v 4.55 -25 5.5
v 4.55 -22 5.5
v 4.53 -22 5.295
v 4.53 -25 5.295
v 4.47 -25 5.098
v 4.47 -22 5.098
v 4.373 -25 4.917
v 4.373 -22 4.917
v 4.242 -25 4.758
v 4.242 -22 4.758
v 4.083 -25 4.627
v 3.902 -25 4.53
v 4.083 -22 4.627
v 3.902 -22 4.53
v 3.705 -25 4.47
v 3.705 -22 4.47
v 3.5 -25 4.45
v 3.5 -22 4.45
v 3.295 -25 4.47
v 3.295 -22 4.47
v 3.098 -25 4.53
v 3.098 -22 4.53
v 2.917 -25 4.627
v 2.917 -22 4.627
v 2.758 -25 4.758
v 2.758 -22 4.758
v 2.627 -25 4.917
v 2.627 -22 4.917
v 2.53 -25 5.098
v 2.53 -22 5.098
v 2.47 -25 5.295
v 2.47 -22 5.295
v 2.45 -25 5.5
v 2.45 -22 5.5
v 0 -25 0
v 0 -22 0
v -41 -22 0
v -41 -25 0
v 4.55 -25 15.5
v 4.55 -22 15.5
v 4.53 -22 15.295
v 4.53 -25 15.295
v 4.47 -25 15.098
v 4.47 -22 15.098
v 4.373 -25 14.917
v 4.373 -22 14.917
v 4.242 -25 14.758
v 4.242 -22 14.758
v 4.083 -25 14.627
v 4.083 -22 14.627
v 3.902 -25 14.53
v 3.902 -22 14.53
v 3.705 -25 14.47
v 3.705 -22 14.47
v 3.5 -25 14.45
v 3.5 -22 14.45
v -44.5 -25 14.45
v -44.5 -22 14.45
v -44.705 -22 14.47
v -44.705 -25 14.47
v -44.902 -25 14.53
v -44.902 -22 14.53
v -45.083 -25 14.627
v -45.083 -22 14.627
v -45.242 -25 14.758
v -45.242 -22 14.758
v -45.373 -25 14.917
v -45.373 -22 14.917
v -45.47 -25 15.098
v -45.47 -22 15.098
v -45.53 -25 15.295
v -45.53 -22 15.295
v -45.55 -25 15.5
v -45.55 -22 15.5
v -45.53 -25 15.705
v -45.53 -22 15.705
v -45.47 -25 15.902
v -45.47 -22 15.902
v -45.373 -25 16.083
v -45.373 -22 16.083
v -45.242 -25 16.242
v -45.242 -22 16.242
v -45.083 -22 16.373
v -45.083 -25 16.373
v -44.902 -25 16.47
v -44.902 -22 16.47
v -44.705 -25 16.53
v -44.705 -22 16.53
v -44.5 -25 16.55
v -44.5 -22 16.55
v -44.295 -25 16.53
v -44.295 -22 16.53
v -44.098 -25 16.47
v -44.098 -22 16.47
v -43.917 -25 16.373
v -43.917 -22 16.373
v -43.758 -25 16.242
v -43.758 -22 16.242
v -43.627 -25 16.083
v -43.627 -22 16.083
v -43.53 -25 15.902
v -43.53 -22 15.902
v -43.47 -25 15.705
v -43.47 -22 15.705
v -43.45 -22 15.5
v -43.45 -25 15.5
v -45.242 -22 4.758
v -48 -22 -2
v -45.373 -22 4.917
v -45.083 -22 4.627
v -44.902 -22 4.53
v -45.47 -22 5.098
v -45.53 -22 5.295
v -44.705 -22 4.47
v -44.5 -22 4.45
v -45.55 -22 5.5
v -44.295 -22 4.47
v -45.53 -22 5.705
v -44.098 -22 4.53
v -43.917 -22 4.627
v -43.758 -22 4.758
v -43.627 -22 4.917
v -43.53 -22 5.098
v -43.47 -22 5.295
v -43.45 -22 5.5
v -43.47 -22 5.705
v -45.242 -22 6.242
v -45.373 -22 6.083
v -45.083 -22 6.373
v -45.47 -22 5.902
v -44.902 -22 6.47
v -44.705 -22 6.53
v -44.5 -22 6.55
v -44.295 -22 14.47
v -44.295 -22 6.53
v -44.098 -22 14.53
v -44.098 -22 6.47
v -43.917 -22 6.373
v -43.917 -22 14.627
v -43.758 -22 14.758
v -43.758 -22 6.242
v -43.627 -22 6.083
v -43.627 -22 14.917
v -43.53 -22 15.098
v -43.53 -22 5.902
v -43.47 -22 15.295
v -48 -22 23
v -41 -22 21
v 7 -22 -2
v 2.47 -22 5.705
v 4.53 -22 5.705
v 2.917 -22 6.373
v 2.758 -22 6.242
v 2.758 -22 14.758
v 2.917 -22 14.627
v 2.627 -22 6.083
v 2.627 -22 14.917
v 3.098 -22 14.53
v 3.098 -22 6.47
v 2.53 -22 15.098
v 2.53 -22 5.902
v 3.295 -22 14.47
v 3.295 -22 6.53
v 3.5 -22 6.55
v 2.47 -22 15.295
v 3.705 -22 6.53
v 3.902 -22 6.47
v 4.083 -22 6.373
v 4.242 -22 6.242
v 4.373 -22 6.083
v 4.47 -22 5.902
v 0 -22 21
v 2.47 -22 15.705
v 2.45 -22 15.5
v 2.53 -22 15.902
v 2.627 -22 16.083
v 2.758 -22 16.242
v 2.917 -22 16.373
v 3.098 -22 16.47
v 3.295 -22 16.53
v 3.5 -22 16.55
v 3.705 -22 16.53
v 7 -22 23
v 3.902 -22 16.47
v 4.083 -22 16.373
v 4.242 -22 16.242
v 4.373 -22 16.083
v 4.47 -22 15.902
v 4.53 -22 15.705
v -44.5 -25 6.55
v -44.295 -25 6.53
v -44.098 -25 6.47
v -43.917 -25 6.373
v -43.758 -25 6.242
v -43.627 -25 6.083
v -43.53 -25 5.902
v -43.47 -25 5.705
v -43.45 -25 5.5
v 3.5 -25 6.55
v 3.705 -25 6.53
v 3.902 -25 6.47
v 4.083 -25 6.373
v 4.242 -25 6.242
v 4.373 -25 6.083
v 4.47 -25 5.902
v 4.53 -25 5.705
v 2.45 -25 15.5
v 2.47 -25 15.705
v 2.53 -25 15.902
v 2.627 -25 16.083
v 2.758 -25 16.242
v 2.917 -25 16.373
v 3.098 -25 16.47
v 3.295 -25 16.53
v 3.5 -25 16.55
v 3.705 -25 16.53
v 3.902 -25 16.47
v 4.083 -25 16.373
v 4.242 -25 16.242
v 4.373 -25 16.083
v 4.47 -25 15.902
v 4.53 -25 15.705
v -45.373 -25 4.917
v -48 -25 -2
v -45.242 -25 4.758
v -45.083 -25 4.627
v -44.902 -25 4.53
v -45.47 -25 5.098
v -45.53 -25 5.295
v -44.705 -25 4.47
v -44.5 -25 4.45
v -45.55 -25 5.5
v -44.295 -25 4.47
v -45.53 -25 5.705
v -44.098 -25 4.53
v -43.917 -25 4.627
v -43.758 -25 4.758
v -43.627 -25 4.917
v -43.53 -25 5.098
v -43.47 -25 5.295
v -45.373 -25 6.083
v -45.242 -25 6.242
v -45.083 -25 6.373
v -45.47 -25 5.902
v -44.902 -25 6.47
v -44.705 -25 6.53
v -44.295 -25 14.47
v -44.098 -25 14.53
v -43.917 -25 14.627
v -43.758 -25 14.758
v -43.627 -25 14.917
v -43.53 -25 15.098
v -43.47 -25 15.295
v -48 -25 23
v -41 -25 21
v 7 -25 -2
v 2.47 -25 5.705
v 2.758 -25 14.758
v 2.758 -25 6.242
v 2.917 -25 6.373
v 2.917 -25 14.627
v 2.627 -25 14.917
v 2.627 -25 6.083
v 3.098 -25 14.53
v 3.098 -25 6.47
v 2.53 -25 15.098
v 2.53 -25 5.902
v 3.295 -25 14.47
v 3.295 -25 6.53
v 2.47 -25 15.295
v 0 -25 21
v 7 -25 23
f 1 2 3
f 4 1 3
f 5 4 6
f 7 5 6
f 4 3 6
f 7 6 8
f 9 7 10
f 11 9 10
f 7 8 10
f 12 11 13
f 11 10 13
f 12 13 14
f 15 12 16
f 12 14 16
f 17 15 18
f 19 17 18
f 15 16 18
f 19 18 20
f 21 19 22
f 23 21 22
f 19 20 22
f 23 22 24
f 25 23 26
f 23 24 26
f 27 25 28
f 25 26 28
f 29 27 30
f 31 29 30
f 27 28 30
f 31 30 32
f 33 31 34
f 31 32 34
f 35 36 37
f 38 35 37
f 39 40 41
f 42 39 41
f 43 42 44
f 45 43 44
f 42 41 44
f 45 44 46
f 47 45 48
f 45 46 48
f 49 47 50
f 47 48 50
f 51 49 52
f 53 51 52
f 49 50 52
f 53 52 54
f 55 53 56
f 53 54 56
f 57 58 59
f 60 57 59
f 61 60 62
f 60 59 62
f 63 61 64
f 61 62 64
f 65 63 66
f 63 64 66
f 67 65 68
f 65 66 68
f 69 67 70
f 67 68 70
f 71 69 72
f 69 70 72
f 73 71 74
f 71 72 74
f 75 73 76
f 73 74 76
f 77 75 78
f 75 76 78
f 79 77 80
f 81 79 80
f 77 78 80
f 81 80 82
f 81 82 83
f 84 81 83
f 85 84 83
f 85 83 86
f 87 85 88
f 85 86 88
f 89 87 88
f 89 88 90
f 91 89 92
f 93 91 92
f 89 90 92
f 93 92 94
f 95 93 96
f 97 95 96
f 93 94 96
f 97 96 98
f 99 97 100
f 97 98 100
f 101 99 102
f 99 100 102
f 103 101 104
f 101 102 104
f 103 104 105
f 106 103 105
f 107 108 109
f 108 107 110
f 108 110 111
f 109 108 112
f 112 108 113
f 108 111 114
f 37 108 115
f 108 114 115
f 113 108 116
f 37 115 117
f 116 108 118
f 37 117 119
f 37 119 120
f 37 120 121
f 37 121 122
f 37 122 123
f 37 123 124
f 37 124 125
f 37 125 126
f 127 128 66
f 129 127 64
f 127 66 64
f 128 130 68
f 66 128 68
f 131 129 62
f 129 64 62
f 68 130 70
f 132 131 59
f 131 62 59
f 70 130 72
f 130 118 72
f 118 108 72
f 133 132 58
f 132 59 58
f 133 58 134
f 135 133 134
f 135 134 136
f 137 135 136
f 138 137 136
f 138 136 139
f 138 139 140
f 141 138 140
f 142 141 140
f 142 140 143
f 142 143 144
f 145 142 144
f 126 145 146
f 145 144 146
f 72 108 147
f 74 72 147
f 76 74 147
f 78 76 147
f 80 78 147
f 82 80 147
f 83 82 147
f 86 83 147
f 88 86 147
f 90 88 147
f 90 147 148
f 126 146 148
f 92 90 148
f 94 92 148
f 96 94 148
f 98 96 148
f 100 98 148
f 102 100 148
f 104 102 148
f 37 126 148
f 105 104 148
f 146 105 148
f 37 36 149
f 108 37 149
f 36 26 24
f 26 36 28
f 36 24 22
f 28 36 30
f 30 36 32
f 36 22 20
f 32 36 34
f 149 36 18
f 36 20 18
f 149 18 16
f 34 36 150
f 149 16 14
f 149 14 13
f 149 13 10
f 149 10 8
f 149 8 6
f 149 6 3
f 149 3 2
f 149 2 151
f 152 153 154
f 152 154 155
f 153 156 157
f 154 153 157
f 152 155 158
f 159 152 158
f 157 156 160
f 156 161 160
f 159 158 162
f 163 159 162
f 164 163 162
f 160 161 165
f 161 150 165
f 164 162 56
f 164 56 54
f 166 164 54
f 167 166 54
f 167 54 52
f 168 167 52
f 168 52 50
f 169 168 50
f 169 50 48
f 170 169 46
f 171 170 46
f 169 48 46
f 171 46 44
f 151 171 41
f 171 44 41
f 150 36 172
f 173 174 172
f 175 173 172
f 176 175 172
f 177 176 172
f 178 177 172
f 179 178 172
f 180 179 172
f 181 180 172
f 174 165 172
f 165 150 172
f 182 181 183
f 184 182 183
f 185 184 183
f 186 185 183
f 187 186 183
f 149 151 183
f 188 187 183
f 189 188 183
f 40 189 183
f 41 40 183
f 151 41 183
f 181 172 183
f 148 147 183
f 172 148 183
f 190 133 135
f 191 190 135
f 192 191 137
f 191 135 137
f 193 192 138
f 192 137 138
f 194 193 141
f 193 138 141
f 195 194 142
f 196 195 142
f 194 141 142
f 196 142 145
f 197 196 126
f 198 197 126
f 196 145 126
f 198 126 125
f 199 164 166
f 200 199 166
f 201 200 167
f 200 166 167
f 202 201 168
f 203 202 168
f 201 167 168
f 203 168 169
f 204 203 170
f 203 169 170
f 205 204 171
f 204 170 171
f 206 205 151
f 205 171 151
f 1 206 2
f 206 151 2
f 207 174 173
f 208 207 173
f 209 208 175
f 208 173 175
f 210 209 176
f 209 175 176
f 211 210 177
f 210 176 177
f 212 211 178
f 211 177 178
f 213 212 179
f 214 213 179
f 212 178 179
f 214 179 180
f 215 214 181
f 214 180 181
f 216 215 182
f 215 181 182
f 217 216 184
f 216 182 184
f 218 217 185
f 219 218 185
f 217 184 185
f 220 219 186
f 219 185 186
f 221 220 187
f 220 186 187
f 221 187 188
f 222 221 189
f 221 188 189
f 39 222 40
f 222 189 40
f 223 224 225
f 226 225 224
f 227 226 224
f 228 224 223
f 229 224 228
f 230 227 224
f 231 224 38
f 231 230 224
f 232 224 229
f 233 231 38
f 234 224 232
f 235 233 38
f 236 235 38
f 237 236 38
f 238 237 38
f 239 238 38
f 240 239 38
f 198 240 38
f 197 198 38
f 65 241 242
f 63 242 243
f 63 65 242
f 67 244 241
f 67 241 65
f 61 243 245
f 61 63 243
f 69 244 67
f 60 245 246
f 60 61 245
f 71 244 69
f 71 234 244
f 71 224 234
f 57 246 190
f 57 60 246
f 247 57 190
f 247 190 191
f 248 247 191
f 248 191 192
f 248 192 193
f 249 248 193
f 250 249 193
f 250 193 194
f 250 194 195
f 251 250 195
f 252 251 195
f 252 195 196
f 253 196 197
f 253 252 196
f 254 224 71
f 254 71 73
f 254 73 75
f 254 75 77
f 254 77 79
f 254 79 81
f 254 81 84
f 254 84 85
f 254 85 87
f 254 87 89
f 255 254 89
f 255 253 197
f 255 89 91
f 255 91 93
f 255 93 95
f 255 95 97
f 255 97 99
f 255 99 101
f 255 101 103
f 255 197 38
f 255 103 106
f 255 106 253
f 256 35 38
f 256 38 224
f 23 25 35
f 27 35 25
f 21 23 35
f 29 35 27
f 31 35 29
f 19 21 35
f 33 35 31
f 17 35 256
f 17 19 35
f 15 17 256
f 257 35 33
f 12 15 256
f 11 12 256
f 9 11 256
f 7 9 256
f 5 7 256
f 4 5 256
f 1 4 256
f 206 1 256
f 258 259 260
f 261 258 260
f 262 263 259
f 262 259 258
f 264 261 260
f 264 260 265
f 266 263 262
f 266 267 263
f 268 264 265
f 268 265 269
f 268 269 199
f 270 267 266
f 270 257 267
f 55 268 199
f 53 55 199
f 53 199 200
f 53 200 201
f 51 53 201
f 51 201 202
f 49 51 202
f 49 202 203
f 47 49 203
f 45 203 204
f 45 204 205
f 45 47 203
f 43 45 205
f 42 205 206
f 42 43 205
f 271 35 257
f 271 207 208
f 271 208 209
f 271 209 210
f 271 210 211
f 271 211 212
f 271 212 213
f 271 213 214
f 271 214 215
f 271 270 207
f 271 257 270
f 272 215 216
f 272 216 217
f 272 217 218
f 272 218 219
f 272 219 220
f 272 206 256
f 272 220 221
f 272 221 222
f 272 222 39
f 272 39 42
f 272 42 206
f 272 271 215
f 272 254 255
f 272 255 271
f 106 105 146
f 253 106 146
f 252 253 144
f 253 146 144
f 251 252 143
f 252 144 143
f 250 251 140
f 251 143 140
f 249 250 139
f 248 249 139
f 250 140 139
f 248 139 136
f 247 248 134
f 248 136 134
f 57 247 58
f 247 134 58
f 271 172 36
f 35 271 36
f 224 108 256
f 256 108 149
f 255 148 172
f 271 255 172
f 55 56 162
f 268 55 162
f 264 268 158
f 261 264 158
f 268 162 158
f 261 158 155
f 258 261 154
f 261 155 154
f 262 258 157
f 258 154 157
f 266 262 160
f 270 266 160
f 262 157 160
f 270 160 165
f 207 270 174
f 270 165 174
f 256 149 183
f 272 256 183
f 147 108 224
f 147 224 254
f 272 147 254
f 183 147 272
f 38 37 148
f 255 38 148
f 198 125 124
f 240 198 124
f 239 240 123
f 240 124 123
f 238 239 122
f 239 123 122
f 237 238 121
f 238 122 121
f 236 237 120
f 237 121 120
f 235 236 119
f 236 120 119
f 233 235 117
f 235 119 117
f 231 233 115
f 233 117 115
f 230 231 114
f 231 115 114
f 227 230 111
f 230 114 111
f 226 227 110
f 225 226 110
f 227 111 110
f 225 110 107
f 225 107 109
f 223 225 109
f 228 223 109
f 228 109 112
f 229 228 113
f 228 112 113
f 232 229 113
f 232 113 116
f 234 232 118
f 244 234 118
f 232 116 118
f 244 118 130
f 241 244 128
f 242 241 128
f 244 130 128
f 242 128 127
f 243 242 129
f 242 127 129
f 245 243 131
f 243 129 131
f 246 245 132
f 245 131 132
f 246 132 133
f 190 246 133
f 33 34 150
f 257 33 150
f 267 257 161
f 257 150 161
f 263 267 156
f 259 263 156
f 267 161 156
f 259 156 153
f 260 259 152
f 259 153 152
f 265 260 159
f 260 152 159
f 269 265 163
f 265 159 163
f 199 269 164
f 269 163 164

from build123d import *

# Parameters (mm, degrees)
F1_START = 22
F0_W     = 55
F0_H     = 25
F1_DEPTH = 3


with BuildPart() as f1:
    # F0 (on Front) → F1 (new body)
    with BuildSketch(Plane.XZ.offset(F1_START)):
        with Locations((-20.5, 10.5)):
            Rectangle(F0_W, F0_H)
        with BuildLine():
            Line((0, 5.5), (0, 0))
            Line((0, 0), (-41, 0))
            Line((-41, 0), (-41, 5.5))
            Line((-41, 5.5), (-43.45, 5.5))
            ThreePointArc((-43.45, 5.5), (-45.2424621202, 4.7575378798), (-44.5, 6.55))
            Line((-44.5, 6.55), (-44.5, 14.45))
            ThreePointArc((-44.5, 14.45), (-45.2424621202, 16.2424621202), (-43.45, 15.5))
            Line((-43.45, 15.5), (-41, 15.5))
            Line((-41, 15.5), (-41, 21))
            Line((-41, 21), (0, 21))
            Line((0, 21), (0, 15.5))
            Line((0, 15.5), (2.45, 15.5))
            ThreePointArc((2.45, 15.5), (3.5, 16.55), (4.55, 15.5))
            ThreePointArc((4.55, 15.5), (4.2424621202, 14.7575378798), (3.5, 14.45))
            Line((3.5, 14.45), (3.5, 6.55))
            ThreePointArc((3.5, 6.55), (4.2424621202, 6.2424621202), (4.55, 5.5))
            ThreePointArc((4.55, 5.5), (3.5, 4.45), (2.45, 5.5))
            Line((2.45, 5.5), (0, 5.5))
        make_face(mode=Mode.SUBTRACT)
        with BuildLine():
            Line((-43.45, 5.5), (-41, 5.5))
            Line((-41, 5.5), (-41, 15.5))
            Line((-41, 15.5), (-43.45, 15.5))
            ThreePointArc((-43.45, 15.5), (-43.7575378798, 14.7575378798), (-44.5, 14.45))
            Line((-44.5, 14.45), (-44.5, 6.55))
            ThreePointArc((-44.5, 6.55), (-43.7575378798, 6.2424621202), (-43.45, 5.5))
        make_face()
        with BuildLine():
            Line((0, 15.5), (0, 5.5))
            Line((0, 5.5), (2.45, 5.5))
            ThreePointArc((2.45, 5.5), (2.7575378798, 6.2424621202), (3.5, 6.55))
            Line((3.5, 6.55), (3.5, 14.45))
            ThreePointArc((3.5, 14.45), (2.7575378798, 14.7575378798), (2.45, 15.5))
            Line((2.45, 15.5), (0, 15.5))
        make_face()
    extrude(amount=F1_DEPTH)


solid = f1.part
